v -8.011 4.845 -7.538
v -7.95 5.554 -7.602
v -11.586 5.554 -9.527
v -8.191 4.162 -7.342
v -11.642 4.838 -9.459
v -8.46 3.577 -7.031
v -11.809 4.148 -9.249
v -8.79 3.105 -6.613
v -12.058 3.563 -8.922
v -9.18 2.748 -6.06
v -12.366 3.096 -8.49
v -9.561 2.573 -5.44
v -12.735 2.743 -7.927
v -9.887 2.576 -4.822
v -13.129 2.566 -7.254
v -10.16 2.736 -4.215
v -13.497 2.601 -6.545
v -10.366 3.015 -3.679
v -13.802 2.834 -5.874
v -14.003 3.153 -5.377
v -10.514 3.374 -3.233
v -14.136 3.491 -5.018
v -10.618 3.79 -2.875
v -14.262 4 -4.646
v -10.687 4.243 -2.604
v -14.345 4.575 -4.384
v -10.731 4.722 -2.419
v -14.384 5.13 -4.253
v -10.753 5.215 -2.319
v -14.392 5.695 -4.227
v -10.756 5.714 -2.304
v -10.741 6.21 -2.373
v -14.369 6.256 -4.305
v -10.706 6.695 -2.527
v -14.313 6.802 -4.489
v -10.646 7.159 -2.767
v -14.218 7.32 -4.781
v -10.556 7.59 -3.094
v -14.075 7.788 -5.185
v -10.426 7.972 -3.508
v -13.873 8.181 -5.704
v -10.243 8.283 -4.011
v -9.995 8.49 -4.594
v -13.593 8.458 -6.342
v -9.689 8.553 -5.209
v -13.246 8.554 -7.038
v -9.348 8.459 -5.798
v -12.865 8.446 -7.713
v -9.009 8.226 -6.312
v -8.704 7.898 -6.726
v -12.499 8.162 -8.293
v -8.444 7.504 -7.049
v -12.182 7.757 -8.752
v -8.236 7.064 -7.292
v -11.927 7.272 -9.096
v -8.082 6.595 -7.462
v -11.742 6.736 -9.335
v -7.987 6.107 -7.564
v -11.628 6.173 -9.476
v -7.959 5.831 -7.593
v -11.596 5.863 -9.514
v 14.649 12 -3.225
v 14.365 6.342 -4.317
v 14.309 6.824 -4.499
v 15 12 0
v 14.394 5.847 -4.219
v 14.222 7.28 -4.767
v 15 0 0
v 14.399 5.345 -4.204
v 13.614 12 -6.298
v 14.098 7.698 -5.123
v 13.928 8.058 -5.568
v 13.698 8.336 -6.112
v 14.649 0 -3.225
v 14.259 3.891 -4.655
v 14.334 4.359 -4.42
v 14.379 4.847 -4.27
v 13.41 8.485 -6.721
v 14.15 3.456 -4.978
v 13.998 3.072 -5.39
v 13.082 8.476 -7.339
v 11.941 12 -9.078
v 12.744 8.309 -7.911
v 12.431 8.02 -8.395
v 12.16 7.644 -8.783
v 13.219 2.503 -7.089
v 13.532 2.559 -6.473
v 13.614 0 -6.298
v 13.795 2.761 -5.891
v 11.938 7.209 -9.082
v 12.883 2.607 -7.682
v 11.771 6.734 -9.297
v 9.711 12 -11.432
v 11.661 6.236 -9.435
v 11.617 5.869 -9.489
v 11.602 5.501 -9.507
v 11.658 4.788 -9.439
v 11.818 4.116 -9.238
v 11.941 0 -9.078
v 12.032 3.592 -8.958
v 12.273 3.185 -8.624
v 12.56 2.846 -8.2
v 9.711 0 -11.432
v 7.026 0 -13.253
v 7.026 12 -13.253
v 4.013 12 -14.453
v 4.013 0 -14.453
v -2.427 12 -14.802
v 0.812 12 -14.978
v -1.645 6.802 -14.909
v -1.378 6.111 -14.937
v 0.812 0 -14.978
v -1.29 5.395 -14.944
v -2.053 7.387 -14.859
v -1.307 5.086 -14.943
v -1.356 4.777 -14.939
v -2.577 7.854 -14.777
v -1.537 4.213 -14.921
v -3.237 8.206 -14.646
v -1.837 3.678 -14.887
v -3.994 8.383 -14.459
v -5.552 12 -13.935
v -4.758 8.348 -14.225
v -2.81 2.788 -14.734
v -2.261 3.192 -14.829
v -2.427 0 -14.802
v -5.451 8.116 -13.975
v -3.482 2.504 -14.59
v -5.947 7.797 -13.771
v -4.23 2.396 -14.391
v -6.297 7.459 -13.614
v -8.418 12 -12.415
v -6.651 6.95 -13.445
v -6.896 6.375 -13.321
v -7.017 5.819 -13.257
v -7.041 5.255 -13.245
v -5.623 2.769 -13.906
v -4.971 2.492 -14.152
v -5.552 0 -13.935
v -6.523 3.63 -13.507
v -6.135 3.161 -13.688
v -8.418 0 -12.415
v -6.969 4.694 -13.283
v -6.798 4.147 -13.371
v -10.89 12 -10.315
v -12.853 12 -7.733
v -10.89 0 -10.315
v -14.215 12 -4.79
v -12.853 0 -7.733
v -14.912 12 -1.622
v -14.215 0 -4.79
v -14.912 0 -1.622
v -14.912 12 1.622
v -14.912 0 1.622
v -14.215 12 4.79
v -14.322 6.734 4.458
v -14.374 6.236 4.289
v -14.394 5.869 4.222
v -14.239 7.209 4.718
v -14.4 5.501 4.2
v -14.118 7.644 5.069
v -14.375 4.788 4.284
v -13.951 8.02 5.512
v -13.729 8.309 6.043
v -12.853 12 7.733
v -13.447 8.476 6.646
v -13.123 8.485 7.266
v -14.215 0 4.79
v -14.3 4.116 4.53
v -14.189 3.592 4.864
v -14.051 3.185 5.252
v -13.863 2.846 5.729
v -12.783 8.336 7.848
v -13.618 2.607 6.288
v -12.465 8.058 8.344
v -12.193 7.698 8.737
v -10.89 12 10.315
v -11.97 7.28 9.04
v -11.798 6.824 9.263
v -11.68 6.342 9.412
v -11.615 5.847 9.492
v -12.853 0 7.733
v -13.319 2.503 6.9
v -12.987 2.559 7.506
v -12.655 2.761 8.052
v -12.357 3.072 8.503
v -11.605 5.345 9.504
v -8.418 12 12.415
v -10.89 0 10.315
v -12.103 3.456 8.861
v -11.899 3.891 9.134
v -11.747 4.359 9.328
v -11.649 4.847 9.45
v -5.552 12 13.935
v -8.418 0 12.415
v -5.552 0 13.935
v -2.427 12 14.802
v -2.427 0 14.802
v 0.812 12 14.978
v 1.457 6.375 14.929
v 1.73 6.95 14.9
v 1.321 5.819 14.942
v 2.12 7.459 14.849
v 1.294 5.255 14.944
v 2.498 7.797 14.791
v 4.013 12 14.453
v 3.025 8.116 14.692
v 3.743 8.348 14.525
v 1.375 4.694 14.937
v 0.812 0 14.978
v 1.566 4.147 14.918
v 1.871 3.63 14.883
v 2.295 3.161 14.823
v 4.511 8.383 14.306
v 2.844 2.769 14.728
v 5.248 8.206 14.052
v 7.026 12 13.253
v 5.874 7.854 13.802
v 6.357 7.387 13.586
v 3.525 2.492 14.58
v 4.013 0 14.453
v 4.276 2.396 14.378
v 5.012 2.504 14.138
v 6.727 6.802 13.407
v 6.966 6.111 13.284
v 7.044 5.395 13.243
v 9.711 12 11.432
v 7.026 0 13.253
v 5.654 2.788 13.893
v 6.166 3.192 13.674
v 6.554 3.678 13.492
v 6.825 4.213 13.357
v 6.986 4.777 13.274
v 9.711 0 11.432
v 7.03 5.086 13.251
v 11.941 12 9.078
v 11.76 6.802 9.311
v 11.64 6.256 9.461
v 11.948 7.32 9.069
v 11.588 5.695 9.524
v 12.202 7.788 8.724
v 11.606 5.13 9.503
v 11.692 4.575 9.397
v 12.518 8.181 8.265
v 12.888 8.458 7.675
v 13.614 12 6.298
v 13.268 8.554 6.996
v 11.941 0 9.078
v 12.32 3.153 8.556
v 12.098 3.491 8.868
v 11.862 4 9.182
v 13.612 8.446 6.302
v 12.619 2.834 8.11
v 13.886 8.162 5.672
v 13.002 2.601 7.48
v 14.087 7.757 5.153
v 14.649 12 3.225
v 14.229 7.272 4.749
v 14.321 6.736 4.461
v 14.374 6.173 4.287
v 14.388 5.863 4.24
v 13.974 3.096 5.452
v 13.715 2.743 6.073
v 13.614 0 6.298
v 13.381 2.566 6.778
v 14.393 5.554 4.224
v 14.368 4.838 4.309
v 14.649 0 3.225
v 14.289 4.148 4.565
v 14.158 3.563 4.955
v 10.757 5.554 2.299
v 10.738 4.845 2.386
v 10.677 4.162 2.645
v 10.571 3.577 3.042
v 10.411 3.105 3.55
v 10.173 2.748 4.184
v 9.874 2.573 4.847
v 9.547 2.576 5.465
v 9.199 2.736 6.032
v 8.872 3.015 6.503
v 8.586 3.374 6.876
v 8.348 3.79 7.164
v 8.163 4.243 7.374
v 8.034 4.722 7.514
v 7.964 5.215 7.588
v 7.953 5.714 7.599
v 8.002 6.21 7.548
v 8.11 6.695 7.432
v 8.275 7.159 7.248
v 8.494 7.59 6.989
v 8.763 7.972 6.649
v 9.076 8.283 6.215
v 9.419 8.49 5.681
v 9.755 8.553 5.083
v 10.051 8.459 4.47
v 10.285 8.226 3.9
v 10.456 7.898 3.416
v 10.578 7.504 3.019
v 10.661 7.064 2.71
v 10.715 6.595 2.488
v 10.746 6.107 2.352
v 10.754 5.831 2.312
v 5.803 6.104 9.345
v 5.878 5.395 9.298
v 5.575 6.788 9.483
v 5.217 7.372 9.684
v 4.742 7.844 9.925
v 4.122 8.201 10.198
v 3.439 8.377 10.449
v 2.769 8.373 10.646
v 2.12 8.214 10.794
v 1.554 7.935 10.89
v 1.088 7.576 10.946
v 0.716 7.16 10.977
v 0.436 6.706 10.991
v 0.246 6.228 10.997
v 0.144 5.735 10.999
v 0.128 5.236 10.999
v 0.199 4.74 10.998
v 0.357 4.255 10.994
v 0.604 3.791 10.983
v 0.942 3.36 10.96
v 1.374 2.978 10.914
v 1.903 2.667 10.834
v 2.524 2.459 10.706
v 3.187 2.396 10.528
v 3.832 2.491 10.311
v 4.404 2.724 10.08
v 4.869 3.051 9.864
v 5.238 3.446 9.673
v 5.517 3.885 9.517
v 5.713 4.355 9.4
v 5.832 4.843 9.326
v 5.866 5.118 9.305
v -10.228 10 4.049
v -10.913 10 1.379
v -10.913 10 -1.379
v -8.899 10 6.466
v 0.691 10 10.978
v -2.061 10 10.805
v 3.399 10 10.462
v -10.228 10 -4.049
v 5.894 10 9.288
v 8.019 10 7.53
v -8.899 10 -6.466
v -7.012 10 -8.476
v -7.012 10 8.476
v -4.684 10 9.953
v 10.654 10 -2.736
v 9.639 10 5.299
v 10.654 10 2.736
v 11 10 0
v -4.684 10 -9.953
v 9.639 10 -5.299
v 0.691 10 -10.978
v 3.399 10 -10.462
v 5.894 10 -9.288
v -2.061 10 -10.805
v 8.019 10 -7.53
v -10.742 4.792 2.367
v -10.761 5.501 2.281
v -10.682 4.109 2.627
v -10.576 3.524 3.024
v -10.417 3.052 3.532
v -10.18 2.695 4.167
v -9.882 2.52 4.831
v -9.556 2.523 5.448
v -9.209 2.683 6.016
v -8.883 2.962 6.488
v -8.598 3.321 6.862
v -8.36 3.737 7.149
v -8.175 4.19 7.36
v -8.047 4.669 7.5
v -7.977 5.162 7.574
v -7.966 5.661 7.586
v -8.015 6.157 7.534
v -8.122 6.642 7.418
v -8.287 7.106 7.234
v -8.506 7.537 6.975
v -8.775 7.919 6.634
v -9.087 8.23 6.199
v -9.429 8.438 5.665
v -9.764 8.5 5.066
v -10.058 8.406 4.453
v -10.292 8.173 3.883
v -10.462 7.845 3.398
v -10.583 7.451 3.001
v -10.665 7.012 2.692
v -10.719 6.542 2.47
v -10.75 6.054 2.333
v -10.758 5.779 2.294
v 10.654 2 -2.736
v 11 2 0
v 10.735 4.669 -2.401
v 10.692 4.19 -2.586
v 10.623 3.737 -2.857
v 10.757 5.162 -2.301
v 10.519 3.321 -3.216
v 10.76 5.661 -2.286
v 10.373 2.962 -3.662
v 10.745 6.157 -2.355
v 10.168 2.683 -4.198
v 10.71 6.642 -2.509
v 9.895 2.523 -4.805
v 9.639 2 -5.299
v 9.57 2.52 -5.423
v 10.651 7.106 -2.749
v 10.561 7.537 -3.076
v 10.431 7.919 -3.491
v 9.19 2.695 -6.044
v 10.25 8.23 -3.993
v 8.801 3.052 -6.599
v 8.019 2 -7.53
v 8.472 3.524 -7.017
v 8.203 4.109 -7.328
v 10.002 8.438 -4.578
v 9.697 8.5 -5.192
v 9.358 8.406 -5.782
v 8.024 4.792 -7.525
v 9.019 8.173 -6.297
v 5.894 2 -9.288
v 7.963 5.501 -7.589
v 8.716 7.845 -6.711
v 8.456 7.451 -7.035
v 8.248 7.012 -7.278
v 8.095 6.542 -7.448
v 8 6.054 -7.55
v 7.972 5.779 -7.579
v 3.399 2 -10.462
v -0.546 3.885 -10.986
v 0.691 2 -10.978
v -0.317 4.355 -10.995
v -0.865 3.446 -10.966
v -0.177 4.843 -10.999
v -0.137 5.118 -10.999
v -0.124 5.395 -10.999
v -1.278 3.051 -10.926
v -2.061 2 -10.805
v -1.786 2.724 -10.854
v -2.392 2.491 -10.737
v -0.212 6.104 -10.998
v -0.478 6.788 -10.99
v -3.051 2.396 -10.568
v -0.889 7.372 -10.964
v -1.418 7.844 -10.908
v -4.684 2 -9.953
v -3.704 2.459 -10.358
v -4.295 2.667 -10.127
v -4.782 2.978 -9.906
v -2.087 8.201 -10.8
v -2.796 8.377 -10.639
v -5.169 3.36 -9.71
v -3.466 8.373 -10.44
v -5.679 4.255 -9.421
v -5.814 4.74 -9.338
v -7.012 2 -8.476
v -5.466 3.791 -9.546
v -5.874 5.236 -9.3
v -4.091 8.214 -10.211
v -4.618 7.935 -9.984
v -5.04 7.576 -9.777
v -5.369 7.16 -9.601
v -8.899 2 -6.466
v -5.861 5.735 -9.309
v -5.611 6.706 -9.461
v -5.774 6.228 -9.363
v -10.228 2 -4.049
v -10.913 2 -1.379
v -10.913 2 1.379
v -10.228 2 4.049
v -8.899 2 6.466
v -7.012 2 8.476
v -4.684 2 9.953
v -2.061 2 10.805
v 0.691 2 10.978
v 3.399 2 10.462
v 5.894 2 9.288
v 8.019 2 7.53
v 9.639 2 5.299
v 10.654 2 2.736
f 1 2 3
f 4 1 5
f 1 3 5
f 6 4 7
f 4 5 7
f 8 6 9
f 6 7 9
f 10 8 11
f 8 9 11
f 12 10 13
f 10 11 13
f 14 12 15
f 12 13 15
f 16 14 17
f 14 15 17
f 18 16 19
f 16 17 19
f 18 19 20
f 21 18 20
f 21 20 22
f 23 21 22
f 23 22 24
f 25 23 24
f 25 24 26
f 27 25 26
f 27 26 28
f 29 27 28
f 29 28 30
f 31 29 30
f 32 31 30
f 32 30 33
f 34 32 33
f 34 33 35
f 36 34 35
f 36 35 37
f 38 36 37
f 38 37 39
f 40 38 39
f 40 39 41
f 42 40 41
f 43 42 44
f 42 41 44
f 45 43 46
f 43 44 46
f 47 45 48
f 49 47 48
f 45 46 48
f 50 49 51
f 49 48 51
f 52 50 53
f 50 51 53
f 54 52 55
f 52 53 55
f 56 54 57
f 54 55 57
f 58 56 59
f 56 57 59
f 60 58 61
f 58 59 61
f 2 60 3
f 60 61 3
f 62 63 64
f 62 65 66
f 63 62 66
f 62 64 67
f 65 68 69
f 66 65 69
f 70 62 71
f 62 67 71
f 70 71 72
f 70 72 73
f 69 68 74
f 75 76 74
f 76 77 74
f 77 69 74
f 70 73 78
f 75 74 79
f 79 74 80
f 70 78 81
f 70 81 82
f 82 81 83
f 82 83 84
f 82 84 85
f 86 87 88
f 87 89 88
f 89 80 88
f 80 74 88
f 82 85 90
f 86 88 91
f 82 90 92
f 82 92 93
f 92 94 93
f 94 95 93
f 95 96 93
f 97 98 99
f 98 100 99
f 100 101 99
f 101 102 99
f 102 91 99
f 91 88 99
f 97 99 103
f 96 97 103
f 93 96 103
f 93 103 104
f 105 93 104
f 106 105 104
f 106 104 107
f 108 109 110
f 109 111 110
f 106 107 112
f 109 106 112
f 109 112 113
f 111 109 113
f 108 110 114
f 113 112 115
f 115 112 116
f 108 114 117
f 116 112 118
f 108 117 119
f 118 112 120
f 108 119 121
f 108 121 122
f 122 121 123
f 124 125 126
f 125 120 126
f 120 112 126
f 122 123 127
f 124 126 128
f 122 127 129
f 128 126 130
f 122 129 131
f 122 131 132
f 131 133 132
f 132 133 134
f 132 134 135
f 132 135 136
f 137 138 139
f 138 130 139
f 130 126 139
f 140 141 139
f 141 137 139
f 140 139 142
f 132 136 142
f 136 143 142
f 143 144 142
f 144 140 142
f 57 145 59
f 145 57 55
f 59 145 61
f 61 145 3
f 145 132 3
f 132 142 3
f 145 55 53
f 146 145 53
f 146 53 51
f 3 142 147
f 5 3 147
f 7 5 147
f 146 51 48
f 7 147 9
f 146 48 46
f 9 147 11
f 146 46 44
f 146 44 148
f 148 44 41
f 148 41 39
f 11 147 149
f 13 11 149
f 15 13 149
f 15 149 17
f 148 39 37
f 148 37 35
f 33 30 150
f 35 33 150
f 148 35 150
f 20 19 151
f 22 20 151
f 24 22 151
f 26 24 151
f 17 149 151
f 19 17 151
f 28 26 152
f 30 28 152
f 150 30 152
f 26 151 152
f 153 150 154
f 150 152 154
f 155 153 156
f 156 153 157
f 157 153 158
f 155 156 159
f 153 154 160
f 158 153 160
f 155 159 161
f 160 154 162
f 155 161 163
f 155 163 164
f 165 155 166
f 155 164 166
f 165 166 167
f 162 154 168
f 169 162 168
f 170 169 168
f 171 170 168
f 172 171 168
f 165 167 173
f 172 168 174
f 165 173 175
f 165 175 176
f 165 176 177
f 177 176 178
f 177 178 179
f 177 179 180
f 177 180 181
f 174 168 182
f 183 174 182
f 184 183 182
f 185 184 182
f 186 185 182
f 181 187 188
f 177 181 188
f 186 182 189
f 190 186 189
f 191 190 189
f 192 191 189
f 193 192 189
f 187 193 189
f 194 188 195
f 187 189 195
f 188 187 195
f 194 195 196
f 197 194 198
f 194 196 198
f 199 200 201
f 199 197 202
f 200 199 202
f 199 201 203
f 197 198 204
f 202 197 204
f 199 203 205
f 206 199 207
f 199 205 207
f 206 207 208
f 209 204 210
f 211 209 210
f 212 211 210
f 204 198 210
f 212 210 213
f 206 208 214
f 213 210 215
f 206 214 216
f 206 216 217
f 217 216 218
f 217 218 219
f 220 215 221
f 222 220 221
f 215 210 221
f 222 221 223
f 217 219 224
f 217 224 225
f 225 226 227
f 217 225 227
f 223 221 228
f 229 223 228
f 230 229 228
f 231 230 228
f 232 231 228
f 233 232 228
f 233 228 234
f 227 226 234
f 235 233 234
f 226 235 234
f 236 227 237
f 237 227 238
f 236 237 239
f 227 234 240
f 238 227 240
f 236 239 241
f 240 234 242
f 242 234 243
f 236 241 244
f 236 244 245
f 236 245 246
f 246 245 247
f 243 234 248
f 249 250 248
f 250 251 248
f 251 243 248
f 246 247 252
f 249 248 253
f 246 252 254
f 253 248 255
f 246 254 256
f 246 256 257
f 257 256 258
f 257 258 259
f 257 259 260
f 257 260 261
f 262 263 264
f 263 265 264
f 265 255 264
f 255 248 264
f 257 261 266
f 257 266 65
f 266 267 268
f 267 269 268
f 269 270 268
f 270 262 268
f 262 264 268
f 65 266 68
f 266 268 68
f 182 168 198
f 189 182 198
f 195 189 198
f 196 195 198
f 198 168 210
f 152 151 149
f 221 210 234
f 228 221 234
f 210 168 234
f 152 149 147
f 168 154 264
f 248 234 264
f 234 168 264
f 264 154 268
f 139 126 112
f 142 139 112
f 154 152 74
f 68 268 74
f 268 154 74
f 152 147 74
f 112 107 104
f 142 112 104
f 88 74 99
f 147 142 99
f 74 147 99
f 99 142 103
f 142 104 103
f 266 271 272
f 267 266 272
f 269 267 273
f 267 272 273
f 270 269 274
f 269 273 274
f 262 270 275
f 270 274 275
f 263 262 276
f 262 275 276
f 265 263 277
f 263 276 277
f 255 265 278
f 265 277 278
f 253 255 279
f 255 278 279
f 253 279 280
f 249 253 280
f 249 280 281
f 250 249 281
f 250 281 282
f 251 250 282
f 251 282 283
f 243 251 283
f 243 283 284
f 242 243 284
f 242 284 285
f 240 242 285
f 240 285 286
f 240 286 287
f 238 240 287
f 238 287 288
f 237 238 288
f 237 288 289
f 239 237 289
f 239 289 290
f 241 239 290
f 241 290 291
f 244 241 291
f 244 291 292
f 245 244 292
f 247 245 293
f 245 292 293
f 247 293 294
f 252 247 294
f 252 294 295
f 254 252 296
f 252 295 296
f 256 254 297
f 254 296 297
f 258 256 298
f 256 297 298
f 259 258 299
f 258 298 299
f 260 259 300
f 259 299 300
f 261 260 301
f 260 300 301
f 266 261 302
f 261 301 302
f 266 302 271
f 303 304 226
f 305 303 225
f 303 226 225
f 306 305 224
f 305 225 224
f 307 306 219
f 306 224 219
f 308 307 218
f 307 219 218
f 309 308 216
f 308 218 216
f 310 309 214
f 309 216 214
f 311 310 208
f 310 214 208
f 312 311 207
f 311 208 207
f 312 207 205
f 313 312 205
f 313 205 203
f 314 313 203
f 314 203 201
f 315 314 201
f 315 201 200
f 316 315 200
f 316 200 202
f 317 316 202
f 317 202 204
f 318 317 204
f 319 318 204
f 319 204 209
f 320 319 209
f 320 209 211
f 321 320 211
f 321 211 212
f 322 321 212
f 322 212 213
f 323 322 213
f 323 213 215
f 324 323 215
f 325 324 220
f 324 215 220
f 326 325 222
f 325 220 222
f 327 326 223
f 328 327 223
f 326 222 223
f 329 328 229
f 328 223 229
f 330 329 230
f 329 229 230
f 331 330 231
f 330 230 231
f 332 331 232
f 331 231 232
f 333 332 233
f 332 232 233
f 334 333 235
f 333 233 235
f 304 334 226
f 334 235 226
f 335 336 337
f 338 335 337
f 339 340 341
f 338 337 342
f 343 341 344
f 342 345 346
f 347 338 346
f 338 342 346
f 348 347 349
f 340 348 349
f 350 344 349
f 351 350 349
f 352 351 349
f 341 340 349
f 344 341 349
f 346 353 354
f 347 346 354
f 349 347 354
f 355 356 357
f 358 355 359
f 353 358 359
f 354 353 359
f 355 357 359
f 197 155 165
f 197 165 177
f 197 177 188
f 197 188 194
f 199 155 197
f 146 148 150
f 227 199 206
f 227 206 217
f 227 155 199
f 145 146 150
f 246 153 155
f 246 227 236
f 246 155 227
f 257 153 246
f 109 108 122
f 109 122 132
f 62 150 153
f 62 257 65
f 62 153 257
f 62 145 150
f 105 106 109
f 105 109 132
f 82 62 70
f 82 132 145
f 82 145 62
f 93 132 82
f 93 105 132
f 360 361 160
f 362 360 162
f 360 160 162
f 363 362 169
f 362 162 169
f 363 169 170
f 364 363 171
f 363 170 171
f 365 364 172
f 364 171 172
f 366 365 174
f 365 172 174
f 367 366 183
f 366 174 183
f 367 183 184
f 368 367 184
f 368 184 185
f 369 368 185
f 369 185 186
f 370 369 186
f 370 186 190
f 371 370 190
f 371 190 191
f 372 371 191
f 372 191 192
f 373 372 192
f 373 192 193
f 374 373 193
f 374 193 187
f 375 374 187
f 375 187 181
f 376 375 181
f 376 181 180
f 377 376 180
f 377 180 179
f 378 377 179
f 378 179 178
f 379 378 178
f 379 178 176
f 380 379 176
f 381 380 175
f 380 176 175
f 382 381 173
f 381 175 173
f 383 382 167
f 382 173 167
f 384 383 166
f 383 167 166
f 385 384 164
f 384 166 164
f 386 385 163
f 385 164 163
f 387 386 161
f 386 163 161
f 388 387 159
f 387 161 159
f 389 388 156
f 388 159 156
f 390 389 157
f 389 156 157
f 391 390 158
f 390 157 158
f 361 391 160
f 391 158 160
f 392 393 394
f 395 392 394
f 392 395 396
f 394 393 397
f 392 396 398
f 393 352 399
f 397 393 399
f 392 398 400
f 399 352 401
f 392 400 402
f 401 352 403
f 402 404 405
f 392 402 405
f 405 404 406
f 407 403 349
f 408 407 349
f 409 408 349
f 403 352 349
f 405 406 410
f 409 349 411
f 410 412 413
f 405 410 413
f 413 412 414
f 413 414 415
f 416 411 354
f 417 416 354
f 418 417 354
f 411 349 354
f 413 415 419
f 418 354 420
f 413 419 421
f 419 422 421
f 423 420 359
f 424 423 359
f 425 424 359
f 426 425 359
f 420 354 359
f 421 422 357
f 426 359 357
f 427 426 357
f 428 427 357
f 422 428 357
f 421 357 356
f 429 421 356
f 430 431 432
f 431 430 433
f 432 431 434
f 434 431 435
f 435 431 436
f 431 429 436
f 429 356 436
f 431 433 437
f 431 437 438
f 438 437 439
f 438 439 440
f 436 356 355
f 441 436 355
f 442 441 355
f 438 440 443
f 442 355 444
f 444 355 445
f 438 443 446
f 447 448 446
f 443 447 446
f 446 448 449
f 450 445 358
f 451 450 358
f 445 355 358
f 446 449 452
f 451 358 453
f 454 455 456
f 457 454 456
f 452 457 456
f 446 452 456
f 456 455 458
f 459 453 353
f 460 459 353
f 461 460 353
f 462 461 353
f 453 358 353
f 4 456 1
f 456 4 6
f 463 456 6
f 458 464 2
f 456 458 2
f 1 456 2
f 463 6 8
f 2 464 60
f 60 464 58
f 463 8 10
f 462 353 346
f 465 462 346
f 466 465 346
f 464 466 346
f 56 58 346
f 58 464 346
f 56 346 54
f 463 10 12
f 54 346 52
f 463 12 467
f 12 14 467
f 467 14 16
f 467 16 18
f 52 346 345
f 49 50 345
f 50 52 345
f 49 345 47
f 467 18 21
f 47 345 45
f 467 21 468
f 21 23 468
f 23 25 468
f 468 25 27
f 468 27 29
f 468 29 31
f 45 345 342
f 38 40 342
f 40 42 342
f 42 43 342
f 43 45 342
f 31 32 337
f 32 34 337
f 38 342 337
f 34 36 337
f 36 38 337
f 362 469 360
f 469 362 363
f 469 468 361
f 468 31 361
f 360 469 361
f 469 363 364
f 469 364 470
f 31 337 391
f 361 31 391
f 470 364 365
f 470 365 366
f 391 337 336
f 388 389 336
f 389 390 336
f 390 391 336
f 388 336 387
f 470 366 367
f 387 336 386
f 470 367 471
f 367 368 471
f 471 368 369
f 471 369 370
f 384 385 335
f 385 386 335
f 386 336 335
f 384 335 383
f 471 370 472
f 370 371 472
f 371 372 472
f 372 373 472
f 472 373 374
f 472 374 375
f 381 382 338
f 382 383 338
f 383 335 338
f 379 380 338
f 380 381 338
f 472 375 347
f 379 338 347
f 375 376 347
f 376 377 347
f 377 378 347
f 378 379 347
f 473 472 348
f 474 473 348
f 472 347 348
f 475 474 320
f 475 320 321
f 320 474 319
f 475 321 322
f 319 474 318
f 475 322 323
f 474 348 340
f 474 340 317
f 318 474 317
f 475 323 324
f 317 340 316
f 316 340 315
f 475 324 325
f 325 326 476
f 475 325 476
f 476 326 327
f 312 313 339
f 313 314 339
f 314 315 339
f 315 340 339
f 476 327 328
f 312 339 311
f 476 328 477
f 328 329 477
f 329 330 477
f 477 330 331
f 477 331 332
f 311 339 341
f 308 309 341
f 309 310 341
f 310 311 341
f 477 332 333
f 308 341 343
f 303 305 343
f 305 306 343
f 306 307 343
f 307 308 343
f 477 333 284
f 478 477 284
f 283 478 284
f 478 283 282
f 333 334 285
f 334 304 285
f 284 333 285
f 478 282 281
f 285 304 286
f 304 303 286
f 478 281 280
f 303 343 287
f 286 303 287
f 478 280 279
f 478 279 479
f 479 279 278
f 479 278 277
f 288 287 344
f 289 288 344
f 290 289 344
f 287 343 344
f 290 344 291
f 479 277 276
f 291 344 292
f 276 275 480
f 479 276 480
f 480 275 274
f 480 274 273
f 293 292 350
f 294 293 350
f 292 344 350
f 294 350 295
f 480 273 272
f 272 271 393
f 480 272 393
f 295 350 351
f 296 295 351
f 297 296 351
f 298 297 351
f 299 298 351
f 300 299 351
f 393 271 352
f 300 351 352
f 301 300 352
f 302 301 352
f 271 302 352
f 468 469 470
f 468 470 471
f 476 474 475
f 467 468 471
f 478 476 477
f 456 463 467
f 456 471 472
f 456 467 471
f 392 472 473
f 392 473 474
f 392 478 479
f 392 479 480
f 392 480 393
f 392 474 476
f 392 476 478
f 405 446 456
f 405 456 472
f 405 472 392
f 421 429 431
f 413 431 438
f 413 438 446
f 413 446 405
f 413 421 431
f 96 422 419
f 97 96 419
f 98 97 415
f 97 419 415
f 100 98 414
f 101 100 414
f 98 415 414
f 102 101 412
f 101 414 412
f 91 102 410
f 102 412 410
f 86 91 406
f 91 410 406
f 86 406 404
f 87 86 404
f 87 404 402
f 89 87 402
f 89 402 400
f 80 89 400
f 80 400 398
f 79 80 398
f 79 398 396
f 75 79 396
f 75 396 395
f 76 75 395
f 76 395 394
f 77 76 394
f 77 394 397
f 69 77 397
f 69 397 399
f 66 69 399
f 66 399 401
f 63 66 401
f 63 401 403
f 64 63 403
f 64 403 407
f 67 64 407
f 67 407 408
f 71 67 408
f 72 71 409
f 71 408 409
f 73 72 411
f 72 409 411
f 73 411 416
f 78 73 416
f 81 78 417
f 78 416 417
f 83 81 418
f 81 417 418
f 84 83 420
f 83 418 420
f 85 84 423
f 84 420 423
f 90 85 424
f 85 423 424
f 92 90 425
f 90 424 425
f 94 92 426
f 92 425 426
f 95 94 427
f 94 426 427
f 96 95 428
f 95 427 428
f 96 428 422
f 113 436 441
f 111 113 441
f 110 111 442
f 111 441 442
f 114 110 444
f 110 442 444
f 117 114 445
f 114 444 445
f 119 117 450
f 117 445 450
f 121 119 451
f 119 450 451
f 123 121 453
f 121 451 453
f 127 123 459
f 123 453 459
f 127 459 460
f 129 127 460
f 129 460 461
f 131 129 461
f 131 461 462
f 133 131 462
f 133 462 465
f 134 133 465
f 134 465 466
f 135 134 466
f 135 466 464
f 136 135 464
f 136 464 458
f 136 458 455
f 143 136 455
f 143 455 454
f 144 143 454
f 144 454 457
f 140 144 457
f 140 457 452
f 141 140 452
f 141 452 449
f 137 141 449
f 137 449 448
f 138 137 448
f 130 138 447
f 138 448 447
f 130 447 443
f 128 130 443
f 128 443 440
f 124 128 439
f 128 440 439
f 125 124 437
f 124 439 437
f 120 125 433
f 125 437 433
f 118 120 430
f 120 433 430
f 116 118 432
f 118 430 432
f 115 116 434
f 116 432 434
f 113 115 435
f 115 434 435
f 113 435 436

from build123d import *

# Parameters (mm, degrees)
SKETCH6_R                          = 15
BOSS_EXTRUDE3_DEPTH                = 12
CUT_EXTRUDE3_START                 = -2
SKETCH8_R                          = 11
CUT_EXTRUDE3_DEPTH                 = 8
F_6_0_6_DIAMETER_HOLE3_D           = 6
F_6_0_6_DIAMETER_HOLE3_ON_FACE_2_D = 6
F_6_0_6_DIAMETER_HOLE3_ON_FACE_3_D = 6


with BuildPart() as part:
    # Sketch6 → Boss-Extrude3 (new body)
    with BuildSketch(Plane(origin=(0, 0, 0), x_dir=(1, 0, 0), z_dir=(0, 1, 0))):
        Circle(SKETCH6_R)
    extrude(amount=BOSS_EXTRUDE3_DEPTH)

    # Sketch8 → Cut-Extrude3 (cut)
    with BuildSketch(Plane(origin=(0, 12, 0), x_dir=(1, 0, 0), z_dir=(0, 1, 0)).offset(CUT_EXTRUDE3_START)):
        Circle(SKETCH8_R)
    extrude(amount=-CUT_EXTRUDE3_DEPTH, mode=Mode.SUBTRACT)

    # Ø6.0 (6) Diameter Hole3 (through all)
    with Locations(Plane(origin=(13.257400922, 5.554097503, 7.017216029), x_dir=(-0.467814402, 0, 0.883826728), z_dir=(0.883826728, 0, 0.467814402))):
        with Locations((1e-09, 0)):
            Hole(F_6_0_6_DIAMETER_HOLE3_D / 2)

    # Ø6.0 (6) Diameter Hole3 on face 2 (through all)
    with Locations(Plane(origin=(13.269259555, 5.5012221, -6.994765961), x_dir=(0.466318067, 0, 0.884617127), z_dir=(0.884617127, 0, -0.466318067))):
        with Locations((0, 0)):
            Hole(F_6_0_6_DIAMETER_HOLE3_ON_FACE_2_D / 2)

    # Ø6.0 (6) Diameter Hole3 on face 3 (through all)
    with Locations(Plane(origin=(-4.253214755, 5.395471292, -14.384372223), x_dir=(-0.958958041, 0, 0.283548012), z_dir=(-0.283548012, 0, -0.958958041))):
        with Locations((0, 0)):
            Hole(F_6_0_6_DIAMETER_HOLE3_ON_FACE_3_D / 2)


solid = part.part
